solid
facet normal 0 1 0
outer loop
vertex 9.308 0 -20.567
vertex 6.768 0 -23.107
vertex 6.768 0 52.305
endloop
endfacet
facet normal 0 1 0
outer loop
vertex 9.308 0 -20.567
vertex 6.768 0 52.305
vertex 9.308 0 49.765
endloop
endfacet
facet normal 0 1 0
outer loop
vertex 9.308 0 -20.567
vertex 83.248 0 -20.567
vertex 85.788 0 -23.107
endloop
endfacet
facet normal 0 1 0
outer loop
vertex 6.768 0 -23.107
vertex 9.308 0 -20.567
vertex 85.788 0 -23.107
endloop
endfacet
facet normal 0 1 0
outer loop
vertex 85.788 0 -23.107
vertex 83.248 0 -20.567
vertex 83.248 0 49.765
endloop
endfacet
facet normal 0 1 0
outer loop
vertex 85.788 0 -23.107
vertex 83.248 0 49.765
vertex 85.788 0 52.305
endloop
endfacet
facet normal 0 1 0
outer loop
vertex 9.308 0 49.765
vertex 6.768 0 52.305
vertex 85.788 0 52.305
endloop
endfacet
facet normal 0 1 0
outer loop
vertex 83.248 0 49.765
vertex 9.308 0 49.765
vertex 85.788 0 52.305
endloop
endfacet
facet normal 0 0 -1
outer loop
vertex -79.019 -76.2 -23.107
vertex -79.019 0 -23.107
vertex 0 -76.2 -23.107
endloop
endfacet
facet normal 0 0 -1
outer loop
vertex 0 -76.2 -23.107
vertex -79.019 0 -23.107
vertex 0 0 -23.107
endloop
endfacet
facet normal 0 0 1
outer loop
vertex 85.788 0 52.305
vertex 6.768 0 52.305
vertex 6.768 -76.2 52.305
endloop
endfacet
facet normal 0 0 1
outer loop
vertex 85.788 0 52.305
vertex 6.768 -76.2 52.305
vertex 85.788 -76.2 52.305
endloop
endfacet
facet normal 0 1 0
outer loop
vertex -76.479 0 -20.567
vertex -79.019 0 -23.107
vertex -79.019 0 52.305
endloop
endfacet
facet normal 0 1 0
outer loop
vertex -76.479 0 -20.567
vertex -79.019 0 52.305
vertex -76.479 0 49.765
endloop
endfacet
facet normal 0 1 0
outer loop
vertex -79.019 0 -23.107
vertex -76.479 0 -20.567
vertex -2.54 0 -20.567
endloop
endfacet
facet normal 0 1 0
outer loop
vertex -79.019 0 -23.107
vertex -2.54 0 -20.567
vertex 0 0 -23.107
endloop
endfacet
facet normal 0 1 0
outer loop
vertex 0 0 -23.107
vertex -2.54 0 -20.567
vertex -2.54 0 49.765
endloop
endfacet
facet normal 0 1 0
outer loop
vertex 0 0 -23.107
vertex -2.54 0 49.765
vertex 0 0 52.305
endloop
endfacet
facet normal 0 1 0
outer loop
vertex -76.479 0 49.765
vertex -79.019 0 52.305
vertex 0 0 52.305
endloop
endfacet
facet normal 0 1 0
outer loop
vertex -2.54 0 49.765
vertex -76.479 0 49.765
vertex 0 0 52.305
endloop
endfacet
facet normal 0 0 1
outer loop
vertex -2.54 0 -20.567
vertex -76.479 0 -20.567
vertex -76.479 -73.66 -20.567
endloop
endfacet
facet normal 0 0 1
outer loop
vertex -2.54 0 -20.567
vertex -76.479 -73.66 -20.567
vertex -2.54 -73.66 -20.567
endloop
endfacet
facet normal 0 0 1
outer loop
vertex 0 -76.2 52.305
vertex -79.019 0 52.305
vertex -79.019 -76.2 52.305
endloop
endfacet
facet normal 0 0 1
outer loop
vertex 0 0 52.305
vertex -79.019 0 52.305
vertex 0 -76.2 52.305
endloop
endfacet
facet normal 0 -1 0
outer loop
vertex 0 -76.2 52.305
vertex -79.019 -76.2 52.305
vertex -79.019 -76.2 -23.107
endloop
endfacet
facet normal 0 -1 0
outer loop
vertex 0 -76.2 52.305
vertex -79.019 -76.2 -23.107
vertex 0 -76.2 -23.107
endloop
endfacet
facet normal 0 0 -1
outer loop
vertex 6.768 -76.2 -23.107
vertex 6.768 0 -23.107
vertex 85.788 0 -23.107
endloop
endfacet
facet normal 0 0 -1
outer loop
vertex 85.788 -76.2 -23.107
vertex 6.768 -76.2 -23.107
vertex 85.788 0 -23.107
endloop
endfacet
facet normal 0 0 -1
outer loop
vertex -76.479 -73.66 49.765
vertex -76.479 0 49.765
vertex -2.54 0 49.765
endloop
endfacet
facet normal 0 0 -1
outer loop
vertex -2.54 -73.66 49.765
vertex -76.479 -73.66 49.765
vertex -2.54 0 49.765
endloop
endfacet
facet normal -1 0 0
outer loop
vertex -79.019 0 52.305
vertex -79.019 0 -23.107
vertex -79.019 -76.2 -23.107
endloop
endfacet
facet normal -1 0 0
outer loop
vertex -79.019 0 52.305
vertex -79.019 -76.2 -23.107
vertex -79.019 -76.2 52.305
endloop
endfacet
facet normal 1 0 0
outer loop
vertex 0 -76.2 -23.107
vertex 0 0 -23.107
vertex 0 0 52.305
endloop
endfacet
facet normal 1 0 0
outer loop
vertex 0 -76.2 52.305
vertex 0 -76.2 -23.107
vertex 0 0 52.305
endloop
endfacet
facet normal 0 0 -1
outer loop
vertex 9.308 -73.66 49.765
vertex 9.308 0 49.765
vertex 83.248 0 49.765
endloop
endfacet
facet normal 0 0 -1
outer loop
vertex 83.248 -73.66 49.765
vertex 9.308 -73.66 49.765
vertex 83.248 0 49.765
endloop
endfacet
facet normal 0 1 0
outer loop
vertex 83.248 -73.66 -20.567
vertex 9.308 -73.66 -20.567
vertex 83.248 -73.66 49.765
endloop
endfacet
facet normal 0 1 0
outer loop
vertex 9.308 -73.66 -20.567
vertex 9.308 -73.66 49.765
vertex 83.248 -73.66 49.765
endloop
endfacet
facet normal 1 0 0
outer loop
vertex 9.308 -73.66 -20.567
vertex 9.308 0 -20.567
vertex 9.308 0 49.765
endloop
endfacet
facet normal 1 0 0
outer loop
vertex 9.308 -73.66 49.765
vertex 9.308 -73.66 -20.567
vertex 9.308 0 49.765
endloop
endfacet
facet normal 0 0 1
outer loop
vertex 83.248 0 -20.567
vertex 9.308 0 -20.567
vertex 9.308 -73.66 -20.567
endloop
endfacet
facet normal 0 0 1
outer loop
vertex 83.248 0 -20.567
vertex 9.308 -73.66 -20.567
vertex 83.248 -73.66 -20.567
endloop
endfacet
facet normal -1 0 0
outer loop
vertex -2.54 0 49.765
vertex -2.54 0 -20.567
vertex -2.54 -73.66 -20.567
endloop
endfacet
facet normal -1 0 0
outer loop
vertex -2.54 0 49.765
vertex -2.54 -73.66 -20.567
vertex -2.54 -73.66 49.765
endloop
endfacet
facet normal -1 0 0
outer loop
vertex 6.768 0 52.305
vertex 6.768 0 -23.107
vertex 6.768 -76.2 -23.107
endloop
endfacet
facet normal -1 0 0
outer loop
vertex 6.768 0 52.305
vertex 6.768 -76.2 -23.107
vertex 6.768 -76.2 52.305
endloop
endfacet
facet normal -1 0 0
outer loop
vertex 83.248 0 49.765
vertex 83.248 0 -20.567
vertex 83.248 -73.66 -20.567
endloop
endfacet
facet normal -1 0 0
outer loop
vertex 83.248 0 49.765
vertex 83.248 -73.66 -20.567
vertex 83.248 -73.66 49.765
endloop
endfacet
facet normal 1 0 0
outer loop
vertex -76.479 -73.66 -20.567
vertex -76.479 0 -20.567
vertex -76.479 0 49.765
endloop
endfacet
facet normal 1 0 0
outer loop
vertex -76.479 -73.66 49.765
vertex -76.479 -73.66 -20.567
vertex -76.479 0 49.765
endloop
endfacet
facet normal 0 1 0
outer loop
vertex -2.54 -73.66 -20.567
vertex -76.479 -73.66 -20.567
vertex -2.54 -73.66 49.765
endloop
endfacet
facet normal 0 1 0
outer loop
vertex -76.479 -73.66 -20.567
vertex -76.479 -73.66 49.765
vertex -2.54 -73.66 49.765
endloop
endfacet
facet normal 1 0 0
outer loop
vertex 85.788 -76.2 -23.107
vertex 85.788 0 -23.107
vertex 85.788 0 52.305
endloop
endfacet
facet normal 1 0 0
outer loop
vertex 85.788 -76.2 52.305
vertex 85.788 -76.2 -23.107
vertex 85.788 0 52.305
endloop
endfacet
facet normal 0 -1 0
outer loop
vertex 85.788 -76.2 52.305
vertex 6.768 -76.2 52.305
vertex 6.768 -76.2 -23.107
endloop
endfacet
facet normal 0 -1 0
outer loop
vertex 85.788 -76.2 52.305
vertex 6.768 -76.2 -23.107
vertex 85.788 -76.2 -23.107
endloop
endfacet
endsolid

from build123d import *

# Parameters (mm, degrees)
F0_W     = 79.0200512856
F0_H     = 75.4120536149
F1_DEPTH = 76.2
F0_W_2   = 79.0194
F2_T     = -2.54
F3_T     = -2.54


with BuildPart() as f1:
    # F0 (on Front) → F1 (new body)
    with BuildSketch(Plane.XZ):
        with Locations((46.2779651723, 14.5988520235)):
            Rectangle(F0_W, F0_H)
    extrude(amount=F1_DEPTH)

    # F2
    f2_openings = [f1.faces().sort_by_distance(p)[0] for p in [
        (46.277965, 0, 14.598852),
    ]]
    offset(amount=F2_T, openings=f2_openings)


with BuildPart() as f1b:
    # F0 (on Front) → F1, piece 2 (new body)
    with BuildSketch(Plane.XZ):
        with Locations((-39.5097, 14.5988520235)):
            Rectangle(F0_W_2, F0_H)
    extrude(amount=F1_DEPTH)

    # F3
    f3_openings = [f1b.faces().sort_by_distance(p)[0] for p in [
        (-39.5097, 0, 14.598852),
    ]]
    offset(amount=F3_T, openings=f3_openings)


solid = Compound([f1.part, f1b.part])
